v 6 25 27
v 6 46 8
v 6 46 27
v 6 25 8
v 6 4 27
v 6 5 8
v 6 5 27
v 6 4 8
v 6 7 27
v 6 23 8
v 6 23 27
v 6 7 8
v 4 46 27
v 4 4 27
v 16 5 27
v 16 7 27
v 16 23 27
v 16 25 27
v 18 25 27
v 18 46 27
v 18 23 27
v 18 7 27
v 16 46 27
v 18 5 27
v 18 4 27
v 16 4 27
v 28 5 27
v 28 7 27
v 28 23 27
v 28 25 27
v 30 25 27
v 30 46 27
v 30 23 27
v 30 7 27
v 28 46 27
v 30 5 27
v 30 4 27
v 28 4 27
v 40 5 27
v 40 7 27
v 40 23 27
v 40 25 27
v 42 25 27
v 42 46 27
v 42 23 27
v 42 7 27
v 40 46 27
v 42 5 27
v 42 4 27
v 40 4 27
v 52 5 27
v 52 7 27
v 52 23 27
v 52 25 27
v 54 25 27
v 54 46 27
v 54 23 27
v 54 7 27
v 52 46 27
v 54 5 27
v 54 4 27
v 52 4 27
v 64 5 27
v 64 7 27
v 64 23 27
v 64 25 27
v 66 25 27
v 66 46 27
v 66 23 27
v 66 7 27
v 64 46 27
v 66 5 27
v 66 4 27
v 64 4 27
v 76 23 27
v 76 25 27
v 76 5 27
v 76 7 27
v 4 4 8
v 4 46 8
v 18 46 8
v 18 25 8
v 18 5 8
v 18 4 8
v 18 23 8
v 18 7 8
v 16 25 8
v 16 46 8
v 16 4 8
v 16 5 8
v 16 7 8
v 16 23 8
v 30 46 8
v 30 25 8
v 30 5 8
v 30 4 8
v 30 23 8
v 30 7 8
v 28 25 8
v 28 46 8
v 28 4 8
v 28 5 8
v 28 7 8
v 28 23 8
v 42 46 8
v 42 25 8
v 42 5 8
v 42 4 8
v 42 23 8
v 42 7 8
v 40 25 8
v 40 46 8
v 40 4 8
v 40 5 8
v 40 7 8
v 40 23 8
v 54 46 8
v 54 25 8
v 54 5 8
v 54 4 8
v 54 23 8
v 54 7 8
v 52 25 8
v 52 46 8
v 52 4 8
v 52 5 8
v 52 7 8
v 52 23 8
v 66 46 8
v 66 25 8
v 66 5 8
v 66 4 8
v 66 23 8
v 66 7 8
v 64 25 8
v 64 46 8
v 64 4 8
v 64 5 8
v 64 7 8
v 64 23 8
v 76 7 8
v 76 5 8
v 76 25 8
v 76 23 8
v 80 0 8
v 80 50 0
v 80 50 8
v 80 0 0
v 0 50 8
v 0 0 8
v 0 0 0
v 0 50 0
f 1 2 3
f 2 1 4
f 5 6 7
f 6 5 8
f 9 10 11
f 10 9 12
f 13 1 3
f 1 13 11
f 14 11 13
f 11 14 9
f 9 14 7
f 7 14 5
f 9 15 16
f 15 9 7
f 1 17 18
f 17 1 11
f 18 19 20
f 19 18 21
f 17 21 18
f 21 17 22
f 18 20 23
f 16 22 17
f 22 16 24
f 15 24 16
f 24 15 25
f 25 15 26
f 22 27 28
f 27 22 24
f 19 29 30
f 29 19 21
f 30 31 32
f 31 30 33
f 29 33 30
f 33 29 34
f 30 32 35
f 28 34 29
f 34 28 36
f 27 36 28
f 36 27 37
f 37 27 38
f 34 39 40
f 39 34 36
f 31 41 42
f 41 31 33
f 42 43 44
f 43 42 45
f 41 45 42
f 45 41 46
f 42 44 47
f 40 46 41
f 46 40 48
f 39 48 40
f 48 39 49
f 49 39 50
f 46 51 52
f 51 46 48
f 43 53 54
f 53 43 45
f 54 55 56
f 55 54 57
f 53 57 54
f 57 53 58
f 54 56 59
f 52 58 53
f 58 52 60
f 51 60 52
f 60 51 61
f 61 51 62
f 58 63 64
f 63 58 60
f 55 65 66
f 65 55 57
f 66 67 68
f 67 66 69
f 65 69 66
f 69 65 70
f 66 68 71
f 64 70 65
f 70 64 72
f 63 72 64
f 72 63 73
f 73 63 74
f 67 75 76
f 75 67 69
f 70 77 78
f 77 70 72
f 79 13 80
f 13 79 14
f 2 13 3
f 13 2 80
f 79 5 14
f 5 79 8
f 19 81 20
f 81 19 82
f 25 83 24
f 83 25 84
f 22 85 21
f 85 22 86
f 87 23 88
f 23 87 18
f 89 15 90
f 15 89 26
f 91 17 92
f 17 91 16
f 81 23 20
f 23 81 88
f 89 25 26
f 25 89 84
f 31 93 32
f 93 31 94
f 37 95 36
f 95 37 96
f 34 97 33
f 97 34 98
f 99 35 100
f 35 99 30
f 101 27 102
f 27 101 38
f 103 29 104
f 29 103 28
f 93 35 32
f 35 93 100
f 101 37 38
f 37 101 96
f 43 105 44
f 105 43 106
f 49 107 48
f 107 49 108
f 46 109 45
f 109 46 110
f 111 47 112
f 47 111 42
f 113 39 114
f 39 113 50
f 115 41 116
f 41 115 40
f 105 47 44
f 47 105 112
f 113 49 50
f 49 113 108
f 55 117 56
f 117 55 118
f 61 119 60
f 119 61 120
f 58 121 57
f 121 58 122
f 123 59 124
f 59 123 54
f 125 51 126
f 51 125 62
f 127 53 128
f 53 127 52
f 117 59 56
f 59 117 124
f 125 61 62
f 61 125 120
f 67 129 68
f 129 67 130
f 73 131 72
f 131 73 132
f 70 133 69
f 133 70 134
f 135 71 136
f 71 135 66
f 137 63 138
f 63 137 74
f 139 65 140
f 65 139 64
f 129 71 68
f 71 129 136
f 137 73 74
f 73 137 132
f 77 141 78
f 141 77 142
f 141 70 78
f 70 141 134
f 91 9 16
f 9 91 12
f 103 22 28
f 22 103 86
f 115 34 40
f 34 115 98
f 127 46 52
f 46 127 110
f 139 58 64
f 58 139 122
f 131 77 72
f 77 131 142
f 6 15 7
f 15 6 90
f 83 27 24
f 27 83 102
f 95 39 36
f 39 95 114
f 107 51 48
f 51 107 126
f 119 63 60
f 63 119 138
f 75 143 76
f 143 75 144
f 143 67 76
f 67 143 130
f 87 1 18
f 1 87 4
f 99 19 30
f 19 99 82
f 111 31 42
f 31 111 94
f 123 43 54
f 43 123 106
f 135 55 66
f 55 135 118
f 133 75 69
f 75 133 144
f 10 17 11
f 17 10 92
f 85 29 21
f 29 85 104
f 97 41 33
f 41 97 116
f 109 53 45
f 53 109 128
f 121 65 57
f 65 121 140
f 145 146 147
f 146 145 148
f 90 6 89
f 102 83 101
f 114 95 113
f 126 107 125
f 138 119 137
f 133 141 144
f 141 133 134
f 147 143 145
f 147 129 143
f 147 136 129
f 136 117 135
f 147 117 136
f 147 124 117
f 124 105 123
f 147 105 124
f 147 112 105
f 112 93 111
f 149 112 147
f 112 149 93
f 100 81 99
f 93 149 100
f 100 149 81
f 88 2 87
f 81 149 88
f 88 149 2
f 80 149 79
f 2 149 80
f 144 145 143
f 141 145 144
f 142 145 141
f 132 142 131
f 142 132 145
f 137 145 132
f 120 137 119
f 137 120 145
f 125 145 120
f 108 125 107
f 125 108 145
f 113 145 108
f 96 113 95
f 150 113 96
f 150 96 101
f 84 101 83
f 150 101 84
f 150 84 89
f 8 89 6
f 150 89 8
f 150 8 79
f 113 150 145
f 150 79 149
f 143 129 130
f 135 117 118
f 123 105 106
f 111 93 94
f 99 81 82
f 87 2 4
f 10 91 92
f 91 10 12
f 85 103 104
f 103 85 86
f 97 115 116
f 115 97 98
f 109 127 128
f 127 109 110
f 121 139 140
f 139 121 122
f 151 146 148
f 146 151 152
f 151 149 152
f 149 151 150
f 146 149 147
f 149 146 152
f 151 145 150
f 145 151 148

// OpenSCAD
$fn = 32;

// ----------------------------------------------------------------------
// Heatsink: cross fin block
// ----------------------------------------------------------------------

// --- parameters (mm) ---
base_l = 80;              // base length, X
base_w = 50;              // base width, Y
base_t = 8;               // base plate thickness
fin_h = 20;               // fin height above the base
fin_t = 2;                // fin thickness
edge = 4;                 // margin from the base ends
pitch = 12;               // fin pitch
rib_pitch = 18;           // cross rib pitch
fit_tol = 0.05;           // tolerance for press fits, mm
free_tol = 0.2;           // tolerance for clearance fits, mm

n_fins = floor((base_l - 2 * edge - fin_t) / pitch) + 1;  // fin count
total_h = base_t + fin_h - 1;  // overall height
n_ribs = floor((base_w - 2 * edge) / rib_pitch);  // rib count

union() {
  cube([base_l, base_w, base_t]);
  for (i = [0 : n_fins - 1])
    translate([edge + i * pitch, edge, base_t - 1])
      cube([fin_t, base_w - 2 * edge, fin_h]);
  for (i = [0 : n_ribs - 1])
    translate([edge, edge + 1 + i * rib_pitch, base_t - 1])
      cube([base_l - 2 * edge, fin_t, fin_h]);
}
